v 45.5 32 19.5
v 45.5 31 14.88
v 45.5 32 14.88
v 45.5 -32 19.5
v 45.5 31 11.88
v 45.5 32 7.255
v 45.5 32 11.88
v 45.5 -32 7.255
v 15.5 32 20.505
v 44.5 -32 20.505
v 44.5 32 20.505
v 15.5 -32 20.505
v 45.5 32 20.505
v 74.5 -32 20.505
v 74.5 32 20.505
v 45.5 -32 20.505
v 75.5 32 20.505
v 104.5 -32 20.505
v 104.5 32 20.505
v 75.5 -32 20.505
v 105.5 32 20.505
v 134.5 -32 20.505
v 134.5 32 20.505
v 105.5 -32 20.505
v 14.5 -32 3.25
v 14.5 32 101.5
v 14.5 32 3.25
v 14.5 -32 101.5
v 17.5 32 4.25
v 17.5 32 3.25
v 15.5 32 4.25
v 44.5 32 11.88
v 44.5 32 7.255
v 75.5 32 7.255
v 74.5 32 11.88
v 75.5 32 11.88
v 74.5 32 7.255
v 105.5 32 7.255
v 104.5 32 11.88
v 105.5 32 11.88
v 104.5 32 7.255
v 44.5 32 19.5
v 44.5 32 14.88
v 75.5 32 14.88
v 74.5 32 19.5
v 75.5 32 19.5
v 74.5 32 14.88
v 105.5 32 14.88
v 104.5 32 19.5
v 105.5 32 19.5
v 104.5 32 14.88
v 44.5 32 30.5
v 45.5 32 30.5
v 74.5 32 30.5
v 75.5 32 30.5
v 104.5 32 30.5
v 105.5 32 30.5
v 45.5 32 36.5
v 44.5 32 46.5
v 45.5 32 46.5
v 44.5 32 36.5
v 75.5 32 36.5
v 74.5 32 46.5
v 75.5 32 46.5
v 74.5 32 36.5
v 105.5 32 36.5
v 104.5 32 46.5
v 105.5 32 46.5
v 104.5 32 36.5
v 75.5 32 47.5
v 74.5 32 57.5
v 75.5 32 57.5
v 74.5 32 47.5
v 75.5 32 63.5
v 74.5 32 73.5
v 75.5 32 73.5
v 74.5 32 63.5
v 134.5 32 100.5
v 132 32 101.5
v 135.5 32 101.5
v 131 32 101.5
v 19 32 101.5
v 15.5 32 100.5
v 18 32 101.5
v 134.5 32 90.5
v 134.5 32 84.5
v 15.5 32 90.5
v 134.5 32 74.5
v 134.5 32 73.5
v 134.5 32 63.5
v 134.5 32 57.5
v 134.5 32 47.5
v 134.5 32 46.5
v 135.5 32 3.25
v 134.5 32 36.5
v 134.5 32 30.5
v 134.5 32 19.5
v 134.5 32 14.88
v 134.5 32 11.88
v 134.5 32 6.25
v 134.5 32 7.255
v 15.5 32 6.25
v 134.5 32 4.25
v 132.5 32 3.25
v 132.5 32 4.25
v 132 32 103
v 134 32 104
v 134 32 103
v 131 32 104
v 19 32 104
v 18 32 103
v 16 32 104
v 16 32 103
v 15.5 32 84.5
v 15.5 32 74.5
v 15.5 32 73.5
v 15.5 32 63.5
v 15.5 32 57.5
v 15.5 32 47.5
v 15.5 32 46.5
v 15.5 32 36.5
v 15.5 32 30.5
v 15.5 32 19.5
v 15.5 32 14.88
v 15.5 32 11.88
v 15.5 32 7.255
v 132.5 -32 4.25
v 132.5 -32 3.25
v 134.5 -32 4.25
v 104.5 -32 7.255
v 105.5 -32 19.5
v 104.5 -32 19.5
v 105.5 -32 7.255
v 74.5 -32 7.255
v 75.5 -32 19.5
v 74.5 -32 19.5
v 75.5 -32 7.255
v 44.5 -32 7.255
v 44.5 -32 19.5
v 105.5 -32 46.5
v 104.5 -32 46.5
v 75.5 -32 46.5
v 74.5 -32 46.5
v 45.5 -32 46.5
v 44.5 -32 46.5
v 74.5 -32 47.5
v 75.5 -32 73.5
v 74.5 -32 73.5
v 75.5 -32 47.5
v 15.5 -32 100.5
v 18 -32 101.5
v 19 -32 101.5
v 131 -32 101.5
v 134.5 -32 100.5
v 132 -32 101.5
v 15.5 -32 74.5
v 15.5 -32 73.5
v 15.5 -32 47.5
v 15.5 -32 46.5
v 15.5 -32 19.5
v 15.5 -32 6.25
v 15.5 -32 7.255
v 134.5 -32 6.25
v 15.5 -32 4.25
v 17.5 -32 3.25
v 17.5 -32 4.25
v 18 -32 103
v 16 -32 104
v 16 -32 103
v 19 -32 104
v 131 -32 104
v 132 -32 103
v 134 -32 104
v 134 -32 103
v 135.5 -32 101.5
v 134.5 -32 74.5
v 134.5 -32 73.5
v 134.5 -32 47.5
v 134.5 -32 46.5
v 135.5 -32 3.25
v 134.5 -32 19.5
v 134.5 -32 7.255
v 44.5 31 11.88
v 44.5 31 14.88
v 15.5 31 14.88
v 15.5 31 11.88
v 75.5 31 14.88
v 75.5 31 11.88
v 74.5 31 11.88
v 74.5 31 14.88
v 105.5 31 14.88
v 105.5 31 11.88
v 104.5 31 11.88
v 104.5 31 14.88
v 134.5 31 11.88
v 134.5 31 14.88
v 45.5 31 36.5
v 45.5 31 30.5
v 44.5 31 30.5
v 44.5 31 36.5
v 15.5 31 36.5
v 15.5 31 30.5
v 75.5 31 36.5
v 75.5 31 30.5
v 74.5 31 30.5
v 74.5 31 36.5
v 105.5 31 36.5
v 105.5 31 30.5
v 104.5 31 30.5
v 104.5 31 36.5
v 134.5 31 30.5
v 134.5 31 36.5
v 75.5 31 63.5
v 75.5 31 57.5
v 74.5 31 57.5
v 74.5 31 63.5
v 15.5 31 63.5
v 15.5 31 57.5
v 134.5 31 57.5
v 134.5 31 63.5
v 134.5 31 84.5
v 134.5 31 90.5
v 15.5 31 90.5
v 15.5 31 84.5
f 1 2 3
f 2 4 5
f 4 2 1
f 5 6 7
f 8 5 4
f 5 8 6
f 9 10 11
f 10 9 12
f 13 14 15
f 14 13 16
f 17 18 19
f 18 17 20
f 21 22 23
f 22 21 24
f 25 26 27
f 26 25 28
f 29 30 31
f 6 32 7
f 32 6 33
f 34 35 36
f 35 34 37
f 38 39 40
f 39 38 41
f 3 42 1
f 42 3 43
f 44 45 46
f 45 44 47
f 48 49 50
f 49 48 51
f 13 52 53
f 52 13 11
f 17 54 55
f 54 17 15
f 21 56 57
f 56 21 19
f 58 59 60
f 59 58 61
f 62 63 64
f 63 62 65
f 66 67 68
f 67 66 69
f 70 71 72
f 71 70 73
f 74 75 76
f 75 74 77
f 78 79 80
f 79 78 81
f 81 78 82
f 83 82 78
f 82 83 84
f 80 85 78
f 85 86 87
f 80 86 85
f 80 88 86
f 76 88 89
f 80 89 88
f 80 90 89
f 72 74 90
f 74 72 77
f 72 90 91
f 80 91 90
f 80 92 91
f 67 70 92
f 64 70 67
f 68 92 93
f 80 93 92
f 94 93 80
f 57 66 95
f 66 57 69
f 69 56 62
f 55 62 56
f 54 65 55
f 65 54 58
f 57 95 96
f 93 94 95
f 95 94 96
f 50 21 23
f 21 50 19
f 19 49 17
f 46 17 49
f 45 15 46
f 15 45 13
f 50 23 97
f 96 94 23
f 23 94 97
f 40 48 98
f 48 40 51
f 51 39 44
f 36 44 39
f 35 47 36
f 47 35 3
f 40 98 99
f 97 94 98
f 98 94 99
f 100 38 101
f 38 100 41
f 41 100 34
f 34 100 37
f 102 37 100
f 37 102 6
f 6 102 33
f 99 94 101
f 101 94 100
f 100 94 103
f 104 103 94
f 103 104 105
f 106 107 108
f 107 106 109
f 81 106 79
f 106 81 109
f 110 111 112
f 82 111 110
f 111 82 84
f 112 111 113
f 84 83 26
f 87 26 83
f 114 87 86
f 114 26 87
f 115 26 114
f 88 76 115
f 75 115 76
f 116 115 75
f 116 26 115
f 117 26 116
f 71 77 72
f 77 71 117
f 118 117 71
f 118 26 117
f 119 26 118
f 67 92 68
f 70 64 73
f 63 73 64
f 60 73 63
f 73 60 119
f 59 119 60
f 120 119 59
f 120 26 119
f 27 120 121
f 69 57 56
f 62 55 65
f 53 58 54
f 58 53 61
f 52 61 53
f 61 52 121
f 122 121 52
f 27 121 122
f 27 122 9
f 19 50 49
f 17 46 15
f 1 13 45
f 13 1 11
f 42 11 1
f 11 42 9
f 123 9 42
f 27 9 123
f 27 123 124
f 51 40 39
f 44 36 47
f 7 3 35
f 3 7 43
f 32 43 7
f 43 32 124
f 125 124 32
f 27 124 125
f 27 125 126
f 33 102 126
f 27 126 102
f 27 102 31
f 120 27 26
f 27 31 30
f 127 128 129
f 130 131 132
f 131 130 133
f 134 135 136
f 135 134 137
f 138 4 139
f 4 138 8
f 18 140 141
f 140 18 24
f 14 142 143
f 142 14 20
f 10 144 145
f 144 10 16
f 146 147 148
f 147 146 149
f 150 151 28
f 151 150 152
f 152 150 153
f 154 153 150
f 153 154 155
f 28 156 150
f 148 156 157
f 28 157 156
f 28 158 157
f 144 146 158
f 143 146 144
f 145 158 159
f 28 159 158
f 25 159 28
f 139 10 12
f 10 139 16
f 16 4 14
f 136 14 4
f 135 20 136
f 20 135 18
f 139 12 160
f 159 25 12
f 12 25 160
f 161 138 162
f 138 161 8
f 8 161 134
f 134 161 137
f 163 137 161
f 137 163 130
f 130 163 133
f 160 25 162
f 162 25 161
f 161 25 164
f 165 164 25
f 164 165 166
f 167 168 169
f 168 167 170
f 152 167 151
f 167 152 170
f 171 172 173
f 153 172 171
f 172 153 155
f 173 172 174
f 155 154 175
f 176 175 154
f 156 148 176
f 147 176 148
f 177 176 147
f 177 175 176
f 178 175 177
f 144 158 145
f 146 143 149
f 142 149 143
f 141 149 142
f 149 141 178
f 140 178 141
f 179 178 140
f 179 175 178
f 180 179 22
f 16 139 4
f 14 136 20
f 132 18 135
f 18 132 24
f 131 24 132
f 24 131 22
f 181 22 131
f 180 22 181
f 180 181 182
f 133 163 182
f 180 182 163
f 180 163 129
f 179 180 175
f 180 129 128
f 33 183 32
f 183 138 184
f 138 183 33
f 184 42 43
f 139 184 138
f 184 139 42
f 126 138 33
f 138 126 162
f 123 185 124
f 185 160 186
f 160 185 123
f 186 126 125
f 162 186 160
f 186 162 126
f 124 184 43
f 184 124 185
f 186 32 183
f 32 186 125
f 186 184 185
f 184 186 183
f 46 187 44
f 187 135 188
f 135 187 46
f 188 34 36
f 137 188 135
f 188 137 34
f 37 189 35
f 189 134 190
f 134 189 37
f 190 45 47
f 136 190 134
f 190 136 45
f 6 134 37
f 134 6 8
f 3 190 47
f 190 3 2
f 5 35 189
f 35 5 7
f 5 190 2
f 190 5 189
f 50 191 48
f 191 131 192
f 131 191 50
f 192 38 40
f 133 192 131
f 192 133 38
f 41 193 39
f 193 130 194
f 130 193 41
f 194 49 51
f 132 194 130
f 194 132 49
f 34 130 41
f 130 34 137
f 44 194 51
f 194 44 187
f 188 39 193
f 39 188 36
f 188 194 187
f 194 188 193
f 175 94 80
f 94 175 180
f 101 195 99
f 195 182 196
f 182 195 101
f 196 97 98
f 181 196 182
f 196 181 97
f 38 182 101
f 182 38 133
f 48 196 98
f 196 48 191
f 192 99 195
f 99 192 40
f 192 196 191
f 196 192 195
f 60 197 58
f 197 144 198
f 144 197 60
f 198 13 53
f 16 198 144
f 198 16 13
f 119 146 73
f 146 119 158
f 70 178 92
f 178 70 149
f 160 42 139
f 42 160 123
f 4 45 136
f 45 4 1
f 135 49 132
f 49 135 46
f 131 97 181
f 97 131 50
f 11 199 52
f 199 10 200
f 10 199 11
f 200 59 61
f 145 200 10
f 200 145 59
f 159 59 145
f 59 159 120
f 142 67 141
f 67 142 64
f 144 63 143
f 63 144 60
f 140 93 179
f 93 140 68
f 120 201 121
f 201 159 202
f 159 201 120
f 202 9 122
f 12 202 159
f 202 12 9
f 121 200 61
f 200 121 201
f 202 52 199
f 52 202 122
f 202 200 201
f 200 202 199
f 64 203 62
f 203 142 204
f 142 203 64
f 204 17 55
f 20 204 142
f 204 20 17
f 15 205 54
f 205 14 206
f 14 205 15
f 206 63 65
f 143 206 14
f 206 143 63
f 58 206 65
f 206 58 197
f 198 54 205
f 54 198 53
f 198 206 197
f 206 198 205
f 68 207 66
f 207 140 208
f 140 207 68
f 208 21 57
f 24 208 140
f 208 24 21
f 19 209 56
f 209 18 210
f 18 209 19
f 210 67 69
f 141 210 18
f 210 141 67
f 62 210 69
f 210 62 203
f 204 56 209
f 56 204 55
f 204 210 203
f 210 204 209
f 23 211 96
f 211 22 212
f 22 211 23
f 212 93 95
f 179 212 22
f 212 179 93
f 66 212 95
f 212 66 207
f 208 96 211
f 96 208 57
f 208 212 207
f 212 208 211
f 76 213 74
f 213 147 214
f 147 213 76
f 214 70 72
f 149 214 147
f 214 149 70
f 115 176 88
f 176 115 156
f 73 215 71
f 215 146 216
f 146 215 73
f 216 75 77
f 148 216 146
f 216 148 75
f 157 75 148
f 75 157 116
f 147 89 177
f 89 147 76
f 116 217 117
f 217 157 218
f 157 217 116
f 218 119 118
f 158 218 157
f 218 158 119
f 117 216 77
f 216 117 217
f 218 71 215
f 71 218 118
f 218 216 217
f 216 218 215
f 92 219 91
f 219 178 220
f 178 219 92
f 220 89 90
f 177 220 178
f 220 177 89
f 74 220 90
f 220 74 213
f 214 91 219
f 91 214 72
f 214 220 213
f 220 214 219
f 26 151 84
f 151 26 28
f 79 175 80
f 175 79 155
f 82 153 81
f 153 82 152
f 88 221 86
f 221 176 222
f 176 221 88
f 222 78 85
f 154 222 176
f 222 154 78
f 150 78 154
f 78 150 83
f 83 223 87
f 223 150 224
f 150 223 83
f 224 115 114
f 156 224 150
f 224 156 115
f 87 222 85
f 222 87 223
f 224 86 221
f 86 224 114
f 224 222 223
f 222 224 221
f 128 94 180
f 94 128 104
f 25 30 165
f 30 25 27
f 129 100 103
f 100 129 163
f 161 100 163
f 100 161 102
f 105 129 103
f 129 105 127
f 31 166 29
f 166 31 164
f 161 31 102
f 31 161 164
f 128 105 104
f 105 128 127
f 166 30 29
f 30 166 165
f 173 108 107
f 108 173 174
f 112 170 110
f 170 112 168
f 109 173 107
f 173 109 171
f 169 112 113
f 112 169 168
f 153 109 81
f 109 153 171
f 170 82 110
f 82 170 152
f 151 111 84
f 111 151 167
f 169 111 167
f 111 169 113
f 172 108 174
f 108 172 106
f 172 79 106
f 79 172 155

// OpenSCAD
// [FL_INDEX: keywords="openscad, 3d_parametric, Customizable_Mini_Storage_Rack_V1_7__Updated_23_07_2015, csg_solid" | COT="Parametric OpenSCAD design from 3DCodeverse"]
// Title: Customizable Mini Storage Rack V1.7 *Updated 23/07/2015*

// Half height row(s)
half_row = 1; // 0:25

// Standard height/width row(s)
normal_row = 1; // 0:25

//Double width row(s)
double_row = 1; // 0:25

//Quad width row(s)
quad_row = 1; // 0:25

//Height (mm)
height = 64;

//Top Mounting Clips
topclip = 1; // 0:1

//Bottom Mounting Clips
btmclip = 1; // 0:1

//Left Mounting Clips
//lftclip = 1; // 0:1

//Right Mounting Clips
//rgtclip = 1; // 0:1



grid();


module grid (){

	if (half_row > 0) {
		for (row = [1:half_row]) {
			for (col = [1 : 4]) {
				translate(v = [col*30, 0, row*13.38]) {
						half_box();
				}
			}
		}
	}

	if (normal_row > 0) {
		for (row = [1:normal_row]) {
			for (col = [1 : 4]) {
				translate(v = [col*30, 0, row*27+(half_row*13.5-7)]) {
						box();
				}
			}
		}
	}

	if (double_row > 0) {
		for (row = [1:double_row]) {
			for (col = [1 : 2]) {
				translate(v = [col*60-15 , 0, row*27+(half_row*13.5-7)+(normal_row*27)]) {
						double_box();
				}
			}
		}
	}

	if (quad_row > 0) {
		for (row = [1:quad_row]) {
			translate(v = [75 , 0, row*27+(half_row*13.5-7)+(normal_row*27)+(double_row*27)]) {
					quad_box();
			}
		}
	}
	if (topclip > 0) {
		translate(v = [14.5,-height/2,3.25]) {
			difference() {
				cube(size = [121,height,4]);
				translate( v = [1,0,1]) {
					cube(size = [119,height,2]);
				}
				translate( v = [3,0,0]) {
					cube(size = [115,height,1]);
				}
			}
		}
	}
	if (btmclip > 0) {
		translate(v = [16,-height/2,half_row*13.5+((normal_row+double_row+quad_row)*27)+7]) {
			difference() {
				cube(size = [118,height,2.5]);
				translate( v = [3,0,0]) {
					cube(size = [112,height,2.5]);
				}
				translate( v = [0,0,0]) {
					cube(size = [2,height,1.5]);
				}
				translate( v = [116,0,0]) {
					cube(size = [2,height,1.5]);
				}
			}
		}
	}
}




module half_box(){
	difference() {
		cube(size = [31,height,14.25], center = true);
		cube(size = [29,height,12.25], center = true);
	}

	translate(v = [0,(height / 2)-0.5,0]) {
		cube(size = [31,1,3], center=true);
	}

}

module box(){
	difference() {
		cube(size = [31,height,28], center = true);
		cube(size = [29,height,26], center = true);
	}

	translate(v = [0,(height / 2)-0.5,0]) {
		cube(size = [31,1,6], center=true);
	}
}

module double_box(){
	difference() {
		cube(size = [61,height,28], center = true);
		cube(size = [59,height,26], center = true);
	}

	translate(v = [0,(height / 2)-0.5,0]) {
		cube(size = [61,1,6], center=true);
	}
}

module quad_box(){
	difference() {
		cube(size = [121,height,28], center = true);
		cube(size = [119,height,26], center = true);
	}

	translate(v = [0,(height / 2)-0.5,0]) {
		cube(size = [121,1,6], center=true);
	}
}
